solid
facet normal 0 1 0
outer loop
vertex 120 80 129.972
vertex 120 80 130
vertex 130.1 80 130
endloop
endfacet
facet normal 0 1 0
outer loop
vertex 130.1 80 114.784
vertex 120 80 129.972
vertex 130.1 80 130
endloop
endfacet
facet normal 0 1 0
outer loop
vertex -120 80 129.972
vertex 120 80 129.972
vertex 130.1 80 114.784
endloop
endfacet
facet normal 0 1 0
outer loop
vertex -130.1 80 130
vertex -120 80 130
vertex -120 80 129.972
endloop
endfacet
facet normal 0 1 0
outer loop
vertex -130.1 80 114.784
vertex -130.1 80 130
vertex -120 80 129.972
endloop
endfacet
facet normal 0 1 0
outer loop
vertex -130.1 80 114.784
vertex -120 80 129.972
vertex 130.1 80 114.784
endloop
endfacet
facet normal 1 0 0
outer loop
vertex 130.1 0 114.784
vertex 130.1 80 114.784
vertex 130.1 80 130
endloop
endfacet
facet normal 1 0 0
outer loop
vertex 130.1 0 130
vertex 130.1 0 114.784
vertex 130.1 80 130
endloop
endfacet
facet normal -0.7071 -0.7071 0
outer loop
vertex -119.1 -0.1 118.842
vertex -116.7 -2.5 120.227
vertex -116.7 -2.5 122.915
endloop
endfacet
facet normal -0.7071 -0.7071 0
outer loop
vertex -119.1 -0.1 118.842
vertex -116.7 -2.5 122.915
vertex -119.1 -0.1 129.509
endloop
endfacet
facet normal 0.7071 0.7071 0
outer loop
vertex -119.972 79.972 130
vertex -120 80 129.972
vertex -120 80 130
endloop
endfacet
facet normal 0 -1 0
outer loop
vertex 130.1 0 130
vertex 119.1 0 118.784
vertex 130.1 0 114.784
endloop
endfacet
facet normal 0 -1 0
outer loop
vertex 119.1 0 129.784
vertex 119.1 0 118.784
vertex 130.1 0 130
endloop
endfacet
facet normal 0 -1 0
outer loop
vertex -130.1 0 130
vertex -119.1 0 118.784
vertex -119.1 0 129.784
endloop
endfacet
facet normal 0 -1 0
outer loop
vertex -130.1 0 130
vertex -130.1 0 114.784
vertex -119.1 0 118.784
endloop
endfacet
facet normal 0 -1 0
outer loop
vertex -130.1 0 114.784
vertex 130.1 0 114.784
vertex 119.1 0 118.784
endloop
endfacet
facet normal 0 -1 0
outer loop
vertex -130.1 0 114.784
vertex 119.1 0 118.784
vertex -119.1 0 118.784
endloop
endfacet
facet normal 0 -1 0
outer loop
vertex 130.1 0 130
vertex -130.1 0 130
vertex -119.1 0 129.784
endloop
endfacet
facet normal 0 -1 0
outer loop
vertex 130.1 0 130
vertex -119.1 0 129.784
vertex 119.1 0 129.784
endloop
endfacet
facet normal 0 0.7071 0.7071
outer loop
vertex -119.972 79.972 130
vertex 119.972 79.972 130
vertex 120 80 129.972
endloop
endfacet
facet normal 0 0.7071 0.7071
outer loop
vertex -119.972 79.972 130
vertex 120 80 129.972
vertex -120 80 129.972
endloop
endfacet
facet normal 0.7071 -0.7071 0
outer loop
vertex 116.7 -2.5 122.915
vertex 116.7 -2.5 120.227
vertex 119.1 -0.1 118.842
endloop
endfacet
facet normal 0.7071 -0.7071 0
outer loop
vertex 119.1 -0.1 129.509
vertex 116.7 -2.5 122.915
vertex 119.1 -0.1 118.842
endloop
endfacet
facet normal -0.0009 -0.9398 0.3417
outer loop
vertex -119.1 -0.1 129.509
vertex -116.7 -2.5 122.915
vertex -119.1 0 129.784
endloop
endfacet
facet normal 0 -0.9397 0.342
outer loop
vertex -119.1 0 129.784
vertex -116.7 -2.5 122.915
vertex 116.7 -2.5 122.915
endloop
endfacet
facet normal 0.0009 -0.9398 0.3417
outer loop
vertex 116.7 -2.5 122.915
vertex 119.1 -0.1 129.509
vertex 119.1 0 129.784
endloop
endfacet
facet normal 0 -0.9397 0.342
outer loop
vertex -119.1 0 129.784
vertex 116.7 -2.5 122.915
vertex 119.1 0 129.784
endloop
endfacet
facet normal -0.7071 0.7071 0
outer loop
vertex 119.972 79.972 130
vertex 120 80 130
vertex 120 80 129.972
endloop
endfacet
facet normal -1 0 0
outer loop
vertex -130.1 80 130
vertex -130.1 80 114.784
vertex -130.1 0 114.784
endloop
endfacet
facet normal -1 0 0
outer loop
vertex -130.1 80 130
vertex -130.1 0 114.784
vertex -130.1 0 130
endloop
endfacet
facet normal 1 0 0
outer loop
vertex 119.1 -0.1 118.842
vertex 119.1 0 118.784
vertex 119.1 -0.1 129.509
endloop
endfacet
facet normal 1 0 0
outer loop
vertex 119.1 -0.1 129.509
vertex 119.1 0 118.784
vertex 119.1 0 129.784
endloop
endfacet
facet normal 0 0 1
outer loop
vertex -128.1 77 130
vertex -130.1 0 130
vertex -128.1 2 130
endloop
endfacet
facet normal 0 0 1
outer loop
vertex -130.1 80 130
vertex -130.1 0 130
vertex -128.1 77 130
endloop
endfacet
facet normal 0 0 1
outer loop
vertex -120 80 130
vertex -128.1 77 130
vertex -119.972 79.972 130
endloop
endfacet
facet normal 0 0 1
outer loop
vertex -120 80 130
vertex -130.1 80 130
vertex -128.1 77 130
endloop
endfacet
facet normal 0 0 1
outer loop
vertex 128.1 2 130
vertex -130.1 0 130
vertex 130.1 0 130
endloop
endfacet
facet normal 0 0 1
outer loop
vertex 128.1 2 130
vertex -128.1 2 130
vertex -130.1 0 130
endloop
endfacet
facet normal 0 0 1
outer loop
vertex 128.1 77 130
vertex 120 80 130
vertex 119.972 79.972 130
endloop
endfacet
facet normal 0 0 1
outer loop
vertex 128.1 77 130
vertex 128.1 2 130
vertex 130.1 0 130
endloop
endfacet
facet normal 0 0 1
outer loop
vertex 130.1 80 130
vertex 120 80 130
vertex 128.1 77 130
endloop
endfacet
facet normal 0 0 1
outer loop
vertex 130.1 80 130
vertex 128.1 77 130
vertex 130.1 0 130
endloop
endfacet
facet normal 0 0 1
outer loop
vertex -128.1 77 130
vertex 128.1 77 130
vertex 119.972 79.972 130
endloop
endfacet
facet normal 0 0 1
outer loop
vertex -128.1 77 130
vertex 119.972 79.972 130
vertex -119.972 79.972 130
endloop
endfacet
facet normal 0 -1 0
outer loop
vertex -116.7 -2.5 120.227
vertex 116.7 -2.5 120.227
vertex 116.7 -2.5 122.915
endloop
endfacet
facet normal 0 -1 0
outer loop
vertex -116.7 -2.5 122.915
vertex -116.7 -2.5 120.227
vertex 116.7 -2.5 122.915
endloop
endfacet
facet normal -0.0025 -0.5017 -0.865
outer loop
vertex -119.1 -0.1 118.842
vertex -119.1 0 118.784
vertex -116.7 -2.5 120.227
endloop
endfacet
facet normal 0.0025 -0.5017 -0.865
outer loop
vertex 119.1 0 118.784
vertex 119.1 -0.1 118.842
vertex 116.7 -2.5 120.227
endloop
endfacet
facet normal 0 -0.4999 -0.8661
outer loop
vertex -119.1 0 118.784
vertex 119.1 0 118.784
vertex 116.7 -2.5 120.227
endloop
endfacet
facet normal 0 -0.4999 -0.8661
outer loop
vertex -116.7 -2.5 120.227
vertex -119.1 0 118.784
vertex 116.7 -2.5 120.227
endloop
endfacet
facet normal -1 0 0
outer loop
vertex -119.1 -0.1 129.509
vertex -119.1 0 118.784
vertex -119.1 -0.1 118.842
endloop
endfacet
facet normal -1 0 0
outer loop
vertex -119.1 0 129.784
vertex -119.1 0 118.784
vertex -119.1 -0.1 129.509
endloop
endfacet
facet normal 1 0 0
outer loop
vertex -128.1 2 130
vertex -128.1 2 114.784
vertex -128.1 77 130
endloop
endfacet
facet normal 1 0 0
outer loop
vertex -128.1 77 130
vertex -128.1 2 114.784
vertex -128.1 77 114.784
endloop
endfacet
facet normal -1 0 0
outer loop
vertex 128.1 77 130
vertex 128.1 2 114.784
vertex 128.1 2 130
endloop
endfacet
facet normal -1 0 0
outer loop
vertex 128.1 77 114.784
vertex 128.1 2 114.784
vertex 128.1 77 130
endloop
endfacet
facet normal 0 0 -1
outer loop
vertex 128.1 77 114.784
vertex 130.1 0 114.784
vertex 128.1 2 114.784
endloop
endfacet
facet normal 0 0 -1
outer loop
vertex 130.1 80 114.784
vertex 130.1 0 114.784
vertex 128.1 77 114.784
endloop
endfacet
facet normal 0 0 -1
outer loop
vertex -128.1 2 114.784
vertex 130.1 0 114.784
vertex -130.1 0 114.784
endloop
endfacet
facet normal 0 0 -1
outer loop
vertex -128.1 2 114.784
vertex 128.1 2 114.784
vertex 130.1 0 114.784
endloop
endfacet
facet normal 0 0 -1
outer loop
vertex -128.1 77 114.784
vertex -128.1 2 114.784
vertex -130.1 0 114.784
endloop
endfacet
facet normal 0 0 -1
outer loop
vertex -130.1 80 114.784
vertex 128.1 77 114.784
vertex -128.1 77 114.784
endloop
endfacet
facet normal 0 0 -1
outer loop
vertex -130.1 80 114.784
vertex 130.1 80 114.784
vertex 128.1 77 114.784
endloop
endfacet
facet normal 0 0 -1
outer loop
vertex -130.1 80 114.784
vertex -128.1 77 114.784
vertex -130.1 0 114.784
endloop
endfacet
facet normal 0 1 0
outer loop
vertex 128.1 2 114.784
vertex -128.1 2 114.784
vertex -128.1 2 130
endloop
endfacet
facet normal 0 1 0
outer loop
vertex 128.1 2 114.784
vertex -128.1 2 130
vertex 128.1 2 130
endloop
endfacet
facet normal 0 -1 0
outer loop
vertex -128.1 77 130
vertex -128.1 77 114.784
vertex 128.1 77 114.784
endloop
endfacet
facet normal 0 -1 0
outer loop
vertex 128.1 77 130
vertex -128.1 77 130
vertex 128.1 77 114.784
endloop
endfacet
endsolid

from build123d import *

# Parameters (mm, degrees)
BOSS_EXTRUDE1_DEPTH                 = 130.100001
BOSS_EXTRUDE1_DEPTH_BACK            = 130.100001
SHELL1_START                        = 85.7839
SHELL1_OUTLINE_W                    = 256.200002558
SHELL1_OUTLINE_H                    = 75
SHELL1_DEPTH                        = 240.188061984
BACK_CORNER_CHAMS_SIZE              = 3
LATCH_RIB_DEPTH                     = 119.100001
LATCH_RIB_CHAMFER_SIZE              = 2.4
LPATTERN1_COUNT                     = 6
LPATTERN1_PITCH                     = 35
LATCH_RIB_CHAMFER_OF_LPATTERN1_SIZE = 2.4
STACKER_LATCH_SLOT_DEPTH            = 120.100001
STACKER_LATCH_SLOT_CHAMFER_SIZE     = 2.5
SKETCH6_W                           = 311.302660761
SKETCH6_H                           = 137.717887742
CUT_EXTRUDE1_DEPTH                  = 31
SKETCH7_W                           = 311.302660761
SKETCH7_H                           = 137.717887742
CUT_EXTRUDE2_DEPTH                  = 249.457280353


with BuildPart() as part:
    # Sketch1 → Boss-Extrude1 (new, two sides: drawn at the far end of the back side and taken through both)
    with BuildSketch(Plane(origin=(0, 0, 0), x_dir=(0, 0, -1), z_dir=(1, 0, 0)).offset(-BOSS_EXTRUDE1_DEPTH_BACK)):
        Polygon((-83.7839, 0), (-279.783940449, 0), (-325.971961984, 80), (-83.7839, 80), align=None)
    extrude(amount=BOSS_EXTRUDE1_DEPTH + BOSS_EXTRUDE1_DEPTH_BACK)

    # Shell1: read off the stored shape, not the designer's step
    # Shell1 outline → Shell1 (cut)
    with BuildSketch(Plane.XY.offset(SHELL1_START)):
        with Locations((0, 39.5)):
            Rectangle(SHELL1_OUTLINE_W, SHELL1_OUTLINE_H)
    extrude(amount=SHELL1_DEPTH, mode=Mode.SUBTRACT)

    # Back Corner Chams
    back_corner_chams_edges = [part.edges().sort_by_distance(p)[0] for p in [
        (-130.100001, 40, 83.7839),
        (130.100001, 40, 83.7839),
    ]]
    chamfer(back_corner_chams_edges, length=BACK_CORNER_CHAMS_SIZE)

    # Sketch2 → Latch Rib (add, symmetric)
    with BuildSketch(Plane(origin=(0, 0, 0), x_dir=(0, 0, -1), z_dir=(1, 0, 0))):
        Polygon((-258.783940449, 0), (-260.227316122, -2.5), (-262.915246901, -2.5), (-269.783940449, 0), align=None)
    latch_rib = extrude(amount=LATCH_RIB_DEPTH, both=True)

    # Latch Rib Chamfer
    latch_rib_chamfer_edges = [part.edges().sort_by_distance(p)[0] for p in [
        (119.100001, -2.5, 261.571281511),
        (-119.100001, -2.5, 261.571281511),
    ]]
    chamfer(latch_rib_chamfer_edges, length=LATCH_RIB_CHAMFER_SIZE)

    # LPattern1: Latch Rib ×6
    with Locations(*[(0, 0, -i * LPATTERN1_PITCH) for i in range(1, LPATTERN1_COUNT)]):
        add(latch_rib)

    # Latch Rib Chamfer of LPattern1
    latch_rib_chamfer_of_lpattern1_edges = [part.edges().sort_by_distance(p)[0] for p in [
        (119.100001, -2.5, 226.571281511),
        (-119.100001, -2.5, 226.571281511),
        (119.100001, -2.5, 191.571281511),
        (-119.100001, -2.5, 191.571281511),
        (119.100001, -2.5, 156.571281511),
        (-119.100001, -2.5, 156.571281511),
        (119.100001, -2.5, 121.571281511),
        (-119.100001, -2.5, 121.571281511),
        (119.100001, -2.5, 86.571281511),
        (-119.100001, -2.5, 86.571281511),
    ]]
    chamfer(latch_rib_chamfer_of_lpattern1_edges, length=LATCH_RIB_CHAMFER_OF_LPATTERN1_SIZE)

    # Sketch3 → Stacker Latch Slot (cut, symmetric)
    with BuildSketch(Plane(origin=(0, 0, 0), x_dir=(0, 0, -1), z_dir=(1, 0, 0))):
        Polygon((-315.971961984, 80), (-304.971961984, 80), (-307.371961984, 77.6), (-309.378016178, 77.6), align=None)
    extrude(amount=STACKER_LATCH_SLOT_DEPTH, both=True, mode=Mode.SUBTRACT)

    # Stacker Latch Slot Chamfer
    # the kernel refuses this chamfer: 2.5 mm, written as the material it adds along each edge
    with BuildSketch(Plane(origin=(120.100001, 77.6, 300.942754515), x_dir=(0, 1, 0), z_dir=(0, 0, 1))) as stacker_latch_slot_chamfer_piece_1_section:
        Polygon((STACKER_LATCH_SLOT_CHAMFER_SIZE, 0), (0, STACKER_LATCH_SLOT_CHAMFER_SIZE), (0, 0), align=None)
    stacker_latch_slot_chamfer_piece_1 = extrude(amount=19.364914362, mode=Mode.PRIVATE)
    stacker_latch_slot_chamfer_piece_1 = split(stacker_latch_slot_chamfer_piece_1, bisect_by=Plane(origin=(120.100001, 80, 300.942754515), z_dir=(0, -1, 0)), keep=Keep.TOP, mode=Mode.PRIVATE)
    add(stacker_latch_slot_chamfer_piece_1)
    with BuildSketch(Plane(origin=(-120.100001, 77.6, 300.942754515), x_dir=(0, 1, 0), z_dir=(0, 0, 1))) as stacker_latch_slot_chamfer_piece_2_section:
        Polygon((STACKER_LATCH_SLOT_CHAMFER_SIZE, 0), (0, -STACKER_LATCH_SLOT_CHAMFER_SIZE), (0, 0), align=None)
    stacker_latch_slot_chamfer_piece_2 = extrude(amount=19.364914362, mode=Mode.PRIVATE)
    stacker_latch_slot_chamfer_piece_2 = split(stacker_latch_slot_chamfer_piece_2, bisect_by=Plane(origin=(-120.100001, 80, 300.942754515), z_dir=(0, -1, 0)), keep=Keep.TOP, mode=Mode.PRIVATE)
    add(stacker_latch_slot_chamfer_piece_2)

    # LPattern2: read off the stored shape, not the designer's step
    # LPattern2: loft between two sections, ruled curve by curve
    lpattern2_from = [
        Edge.make_line((120.000001279, 80, 105.971961984), (120.000001279, 80, 94.971961984)),
        Edge.make_line((-120.000001279, 80, 94.971961984), (-120.000001279, 80, 105.971961984)),
        Edge.make_line((-120.000001279, 80, 105.971961984), (120.000001279, 80, 105.971961984)),
        Edge.make_line((120.000001279, 80, 94.971961984), (-120.000001279, 80, 94.971961984)),
    ]
    lpattern2_to = [
        Edge.make_line((117.600001279, 77.6, 99.378016178), (117.600001279, 77.6, 97.371961984)),
        Edge.make_line((-117.600001279, 77.6, 97.371961984), (-117.600001279, 77.6, 99.378016178)),
        Edge.make_line((-117.600001279, 77.6, 99.378016178), (117.600001279, 77.6, 99.378016178)),
        Edge.make_line((117.600001279, 77.6, 97.371961984), (-117.600001279, 77.6, 97.371961984)),
    ]
    lpattern2 = Solid(Shell([*[Face.make_surface_from_curves(lpattern2_from[k], lpattern2_to[k]) for k in range(4)], Face(Wire(lpattern2_from)), Face(Wire(lpattern2_to))]))
    add(lpattern2, mode=Mode.SUBTRACT)

    # LPattern2 2: loft between two sections, ruled curve by curve
    lpattern2_2_from = [
        Edge.make_line((120.000001279, 80, 140.971961984), (120.000001279, 80, 129.971961984)),
        Edge.make_line((-120.000001279, 80, 129.971961984), (-120.000001279, 80, 140.971961984)),
        Edge.make_line((-120.000001279, 80, 140.971961984), (120.000001279, 80, 140.971961984)),
        Edge.make_line((120.000001279, 80, 129.971961984), (-120.000001279, 80, 129.971961984)),
    ]
    lpattern2_2_to = [
        Edge.make_line((117.600001279, 77.6, 134.378016178), (117.600001279, 77.6, 132.371961984)),
        Edge.make_line((-117.600001279, 77.6, 132.371961984), (-117.600001279, 77.6, 134.378016178)),
        Edge.make_line((-117.600001279, 77.6, 134.378016178), (117.600001279, 77.6, 134.378016178)),
        Edge.make_line((117.600001279, 77.6, 132.371961984), (-117.600001279, 77.6, 132.371961984)),
    ]
    lpattern2_2 = Solid(Shell([*[Face.make_surface_from_curves(lpattern2_2_from[k], lpattern2_2_to[k]) for k in range(4)], Face(Wire(lpattern2_2_from)), Face(Wire(lpattern2_2_to))]))
    add(lpattern2_2, mode=Mode.SUBTRACT)

    # LPattern2 3: loft between two sections, ruled curve by curve
    lpattern2_3_from = [
        Edge.make_line((120.000001279, 80, 175.971961984), (120.000001279, 80, 164.971961984)),
        Edge.make_line((-120.000001279, 80, 164.971961984), (-120.000001279, 80, 175.971961984)),
        Edge.make_line((-120.000001279, 80, 175.971961984), (120.000001279, 80, 175.971961984)),
        Edge.make_line((120.000001279, 80, 164.971961984), (-120.000001279, 80, 164.971961984)),
    ]
    lpattern2_3_to = [
        Edge.make_line((117.600001279, 77.6, 169.378016178), (117.600001279, 77.6, 167.371961984)),
        Edge.make_line((-117.600001279, 77.6, 167.371961984), (-117.600001279, 77.6, 169.378016178)),
        Edge.make_line((-117.600001279, 77.6, 169.378016178), (117.600001279, 77.6, 169.378016178)),
        Edge.make_line((117.600001279, 77.6, 167.371961984), (-117.600001279, 77.6, 167.371961984)),
    ]
    lpattern2_3 = Solid(Shell([*[Face.make_surface_from_curves(lpattern2_3_from[k], lpattern2_3_to[k]) for k in range(4)], Face(Wire(lpattern2_3_from)), Face(Wire(lpattern2_3_to))]))
    add(lpattern2_3, mode=Mode.SUBTRACT)

    # LPattern2 4: loft between two sections, ruled curve by curve
    lpattern2_4_from = [
        Edge.make_line((120.000001279, 80, 210.971961984), (120.000001279, 80, 199.971961984)),
        Edge.make_line((-120.000001279, 80, 199.971961984), (-120.000001279, 80, 210.971961984)),
        Edge.make_line((-120.000001279, 80, 210.971961984), (120.000001279, 80, 210.971961984)),
        Edge.make_line((120.000001279, 80, 199.971961984), (-120.000001279, 80, 199.971961984)),
    ]
    lpattern2_4_to = [
        Edge.make_line((117.600001279, 77.6, 204.378016178), (117.600001279, 77.6, 202.371961984)),
        Edge.make_line((-117.600001279, 77.6, 202.371961984), (-117.600001279, 77.6, 204.378016178)),
        Edge.make_line((-117.600001279, 77.6, 204.378016178), (117.600001279, 77.6, 204.378016178)),
        Edge.make_line((117.600001279, 77.6, 202.371961984), (-117.600001279, 77.6, 202.371961984)),
    ]
    lpattern2_4 = Solid(Shell([*[Face.make_surface_from_curves(lpattern2_4_from[k], lpattern2_4_to[k]) for k in range(4)], Face(Wire(lpattern2_4_from)), Face(Wire(lpattern2_4_to))]))
    add(lpattern2_4, mode=Mode.SUBTRACT)

    # LPattern2 5: loft between two sections, ruled curve by curve
    lpattern2_5_from = [
        Edge.make_line((120.000001279, 80, 245.971961984), (120.000001279, 80, 234.971961984)),
        Edge.make_line((-120.000001279, 80, 234.971961984), (-120.000001279, 80, 245.971961984)),
        Edge.make_line((-120.000001279, 80, 245.971961984), (120.000001279, 80, 245.971961984)),
        Edge.make_line((120.000001279, 80, 234.971961984), (-120.000001279, 80, 234.971961984)),
    ]
    lpattern2_5_to = [
        Edge.make_line((117.600001279, 77.6, 239.378016178), (117.600001279, 77.6, 237.371961984)),
        Edge.make_line((-117.600001279, 77.6, 237.371961984), (-117.600001279, 77.6, 239.378016178)),
        Edge.make_line((-117.600001279, 77.6, 239.378016178), (117.600001279, 77.6, 239.378016178)),
        Edge.make_line((117.600001279, 77.6, 237.371961984), (-117.600001279, 77.6, 237.371961984)),
    ]
    lpattern2_5 = Solid(Shell([*[Face.make_surface_from_curves(lpattern2_5_from[k], lpattern2_5_to[k]) for k in range(4)], Face(Wire(lpattern2_5_from)), Face(Wire(lpattern2_5_to))]))
    add(lpattern2_5, mode=Mode.SUBTRACT)

    # LPattern2 6: loft between two sections, ruled curve by curve
    lpattern2_6_from = [
        Edge.make_line((120.000001279, 80, 280.971961984), (120.000001279, 80, 269.971961984)),
        Edge.make_line((-120.000001279, 80, 269.971961984), (-120.000001279, 80, 280.971961984)),
        Edge.make_line((-120.000001279, 80, 280.971961984), (120.000001279, 80, 280.971961984)),
        Edge.make_line((120.000001279, 80, 269.971961984), (-120.000001279, 80, 269.971961984)),
    ]
    lpattern2_6_to = [
        Edge.make_line((117.600001279, 77.6, 274.378016178), (117.600001279, 77.6, 272.371961984)),
        Edge.make_line((-117.600001279, 77.6, 272.371961984), (-117.600001279, 77.6, 274.378016178)),
        Edge.make_line((-117.600001279, 77.6, 274.378016178), (117.600001279, 77.6, 274.378016178)),
        Edge.make_line((117.600001279, 77.6, 272.371961984), (-117.600001279, 77.6, 272.371961984)),
    ]
    lpattern2_6 = Solid(Shell([*[Face.make_surface_from_curves(lpattern2_6_from[k], lpattern2_6_to[k]) for k in range(4)], Face(Wire(lpattern2_6_from)), Face(Wire(lpattern2_6_to))]))
    add(lpattern2_6, mode=Mode.SUBTRACT)

    # Sketch6 → Cut-Extrude1 (cut)
    with BuildSketch(Plane(origin=(0, 0, 83.7839), x_dir=(-1, 0, 0), z_dir=(0, 0, -1))):
        with Locations((1.437413341, 38.133965711)):
            Rectangle(SKETCH6_W, SKETCH6_H)
    extrude(amount=-CUT_EXTRUDE1_DEPTH, mode=Mode.SUBTRACT)

    # Sketch7 → Cut-Extrude2 (cut, through all)
    with BuildSketch(Plane.XY.offset(130)):
        with Locations((-1.437413341, 38.133965711)):
            Rectangle(SKETCH7_W, SKETCH7_H)
    extrude(amount=CUT_EXTRUDE2_DEPTH, mode=Mode.SUBTRACT)


solid = part.part
